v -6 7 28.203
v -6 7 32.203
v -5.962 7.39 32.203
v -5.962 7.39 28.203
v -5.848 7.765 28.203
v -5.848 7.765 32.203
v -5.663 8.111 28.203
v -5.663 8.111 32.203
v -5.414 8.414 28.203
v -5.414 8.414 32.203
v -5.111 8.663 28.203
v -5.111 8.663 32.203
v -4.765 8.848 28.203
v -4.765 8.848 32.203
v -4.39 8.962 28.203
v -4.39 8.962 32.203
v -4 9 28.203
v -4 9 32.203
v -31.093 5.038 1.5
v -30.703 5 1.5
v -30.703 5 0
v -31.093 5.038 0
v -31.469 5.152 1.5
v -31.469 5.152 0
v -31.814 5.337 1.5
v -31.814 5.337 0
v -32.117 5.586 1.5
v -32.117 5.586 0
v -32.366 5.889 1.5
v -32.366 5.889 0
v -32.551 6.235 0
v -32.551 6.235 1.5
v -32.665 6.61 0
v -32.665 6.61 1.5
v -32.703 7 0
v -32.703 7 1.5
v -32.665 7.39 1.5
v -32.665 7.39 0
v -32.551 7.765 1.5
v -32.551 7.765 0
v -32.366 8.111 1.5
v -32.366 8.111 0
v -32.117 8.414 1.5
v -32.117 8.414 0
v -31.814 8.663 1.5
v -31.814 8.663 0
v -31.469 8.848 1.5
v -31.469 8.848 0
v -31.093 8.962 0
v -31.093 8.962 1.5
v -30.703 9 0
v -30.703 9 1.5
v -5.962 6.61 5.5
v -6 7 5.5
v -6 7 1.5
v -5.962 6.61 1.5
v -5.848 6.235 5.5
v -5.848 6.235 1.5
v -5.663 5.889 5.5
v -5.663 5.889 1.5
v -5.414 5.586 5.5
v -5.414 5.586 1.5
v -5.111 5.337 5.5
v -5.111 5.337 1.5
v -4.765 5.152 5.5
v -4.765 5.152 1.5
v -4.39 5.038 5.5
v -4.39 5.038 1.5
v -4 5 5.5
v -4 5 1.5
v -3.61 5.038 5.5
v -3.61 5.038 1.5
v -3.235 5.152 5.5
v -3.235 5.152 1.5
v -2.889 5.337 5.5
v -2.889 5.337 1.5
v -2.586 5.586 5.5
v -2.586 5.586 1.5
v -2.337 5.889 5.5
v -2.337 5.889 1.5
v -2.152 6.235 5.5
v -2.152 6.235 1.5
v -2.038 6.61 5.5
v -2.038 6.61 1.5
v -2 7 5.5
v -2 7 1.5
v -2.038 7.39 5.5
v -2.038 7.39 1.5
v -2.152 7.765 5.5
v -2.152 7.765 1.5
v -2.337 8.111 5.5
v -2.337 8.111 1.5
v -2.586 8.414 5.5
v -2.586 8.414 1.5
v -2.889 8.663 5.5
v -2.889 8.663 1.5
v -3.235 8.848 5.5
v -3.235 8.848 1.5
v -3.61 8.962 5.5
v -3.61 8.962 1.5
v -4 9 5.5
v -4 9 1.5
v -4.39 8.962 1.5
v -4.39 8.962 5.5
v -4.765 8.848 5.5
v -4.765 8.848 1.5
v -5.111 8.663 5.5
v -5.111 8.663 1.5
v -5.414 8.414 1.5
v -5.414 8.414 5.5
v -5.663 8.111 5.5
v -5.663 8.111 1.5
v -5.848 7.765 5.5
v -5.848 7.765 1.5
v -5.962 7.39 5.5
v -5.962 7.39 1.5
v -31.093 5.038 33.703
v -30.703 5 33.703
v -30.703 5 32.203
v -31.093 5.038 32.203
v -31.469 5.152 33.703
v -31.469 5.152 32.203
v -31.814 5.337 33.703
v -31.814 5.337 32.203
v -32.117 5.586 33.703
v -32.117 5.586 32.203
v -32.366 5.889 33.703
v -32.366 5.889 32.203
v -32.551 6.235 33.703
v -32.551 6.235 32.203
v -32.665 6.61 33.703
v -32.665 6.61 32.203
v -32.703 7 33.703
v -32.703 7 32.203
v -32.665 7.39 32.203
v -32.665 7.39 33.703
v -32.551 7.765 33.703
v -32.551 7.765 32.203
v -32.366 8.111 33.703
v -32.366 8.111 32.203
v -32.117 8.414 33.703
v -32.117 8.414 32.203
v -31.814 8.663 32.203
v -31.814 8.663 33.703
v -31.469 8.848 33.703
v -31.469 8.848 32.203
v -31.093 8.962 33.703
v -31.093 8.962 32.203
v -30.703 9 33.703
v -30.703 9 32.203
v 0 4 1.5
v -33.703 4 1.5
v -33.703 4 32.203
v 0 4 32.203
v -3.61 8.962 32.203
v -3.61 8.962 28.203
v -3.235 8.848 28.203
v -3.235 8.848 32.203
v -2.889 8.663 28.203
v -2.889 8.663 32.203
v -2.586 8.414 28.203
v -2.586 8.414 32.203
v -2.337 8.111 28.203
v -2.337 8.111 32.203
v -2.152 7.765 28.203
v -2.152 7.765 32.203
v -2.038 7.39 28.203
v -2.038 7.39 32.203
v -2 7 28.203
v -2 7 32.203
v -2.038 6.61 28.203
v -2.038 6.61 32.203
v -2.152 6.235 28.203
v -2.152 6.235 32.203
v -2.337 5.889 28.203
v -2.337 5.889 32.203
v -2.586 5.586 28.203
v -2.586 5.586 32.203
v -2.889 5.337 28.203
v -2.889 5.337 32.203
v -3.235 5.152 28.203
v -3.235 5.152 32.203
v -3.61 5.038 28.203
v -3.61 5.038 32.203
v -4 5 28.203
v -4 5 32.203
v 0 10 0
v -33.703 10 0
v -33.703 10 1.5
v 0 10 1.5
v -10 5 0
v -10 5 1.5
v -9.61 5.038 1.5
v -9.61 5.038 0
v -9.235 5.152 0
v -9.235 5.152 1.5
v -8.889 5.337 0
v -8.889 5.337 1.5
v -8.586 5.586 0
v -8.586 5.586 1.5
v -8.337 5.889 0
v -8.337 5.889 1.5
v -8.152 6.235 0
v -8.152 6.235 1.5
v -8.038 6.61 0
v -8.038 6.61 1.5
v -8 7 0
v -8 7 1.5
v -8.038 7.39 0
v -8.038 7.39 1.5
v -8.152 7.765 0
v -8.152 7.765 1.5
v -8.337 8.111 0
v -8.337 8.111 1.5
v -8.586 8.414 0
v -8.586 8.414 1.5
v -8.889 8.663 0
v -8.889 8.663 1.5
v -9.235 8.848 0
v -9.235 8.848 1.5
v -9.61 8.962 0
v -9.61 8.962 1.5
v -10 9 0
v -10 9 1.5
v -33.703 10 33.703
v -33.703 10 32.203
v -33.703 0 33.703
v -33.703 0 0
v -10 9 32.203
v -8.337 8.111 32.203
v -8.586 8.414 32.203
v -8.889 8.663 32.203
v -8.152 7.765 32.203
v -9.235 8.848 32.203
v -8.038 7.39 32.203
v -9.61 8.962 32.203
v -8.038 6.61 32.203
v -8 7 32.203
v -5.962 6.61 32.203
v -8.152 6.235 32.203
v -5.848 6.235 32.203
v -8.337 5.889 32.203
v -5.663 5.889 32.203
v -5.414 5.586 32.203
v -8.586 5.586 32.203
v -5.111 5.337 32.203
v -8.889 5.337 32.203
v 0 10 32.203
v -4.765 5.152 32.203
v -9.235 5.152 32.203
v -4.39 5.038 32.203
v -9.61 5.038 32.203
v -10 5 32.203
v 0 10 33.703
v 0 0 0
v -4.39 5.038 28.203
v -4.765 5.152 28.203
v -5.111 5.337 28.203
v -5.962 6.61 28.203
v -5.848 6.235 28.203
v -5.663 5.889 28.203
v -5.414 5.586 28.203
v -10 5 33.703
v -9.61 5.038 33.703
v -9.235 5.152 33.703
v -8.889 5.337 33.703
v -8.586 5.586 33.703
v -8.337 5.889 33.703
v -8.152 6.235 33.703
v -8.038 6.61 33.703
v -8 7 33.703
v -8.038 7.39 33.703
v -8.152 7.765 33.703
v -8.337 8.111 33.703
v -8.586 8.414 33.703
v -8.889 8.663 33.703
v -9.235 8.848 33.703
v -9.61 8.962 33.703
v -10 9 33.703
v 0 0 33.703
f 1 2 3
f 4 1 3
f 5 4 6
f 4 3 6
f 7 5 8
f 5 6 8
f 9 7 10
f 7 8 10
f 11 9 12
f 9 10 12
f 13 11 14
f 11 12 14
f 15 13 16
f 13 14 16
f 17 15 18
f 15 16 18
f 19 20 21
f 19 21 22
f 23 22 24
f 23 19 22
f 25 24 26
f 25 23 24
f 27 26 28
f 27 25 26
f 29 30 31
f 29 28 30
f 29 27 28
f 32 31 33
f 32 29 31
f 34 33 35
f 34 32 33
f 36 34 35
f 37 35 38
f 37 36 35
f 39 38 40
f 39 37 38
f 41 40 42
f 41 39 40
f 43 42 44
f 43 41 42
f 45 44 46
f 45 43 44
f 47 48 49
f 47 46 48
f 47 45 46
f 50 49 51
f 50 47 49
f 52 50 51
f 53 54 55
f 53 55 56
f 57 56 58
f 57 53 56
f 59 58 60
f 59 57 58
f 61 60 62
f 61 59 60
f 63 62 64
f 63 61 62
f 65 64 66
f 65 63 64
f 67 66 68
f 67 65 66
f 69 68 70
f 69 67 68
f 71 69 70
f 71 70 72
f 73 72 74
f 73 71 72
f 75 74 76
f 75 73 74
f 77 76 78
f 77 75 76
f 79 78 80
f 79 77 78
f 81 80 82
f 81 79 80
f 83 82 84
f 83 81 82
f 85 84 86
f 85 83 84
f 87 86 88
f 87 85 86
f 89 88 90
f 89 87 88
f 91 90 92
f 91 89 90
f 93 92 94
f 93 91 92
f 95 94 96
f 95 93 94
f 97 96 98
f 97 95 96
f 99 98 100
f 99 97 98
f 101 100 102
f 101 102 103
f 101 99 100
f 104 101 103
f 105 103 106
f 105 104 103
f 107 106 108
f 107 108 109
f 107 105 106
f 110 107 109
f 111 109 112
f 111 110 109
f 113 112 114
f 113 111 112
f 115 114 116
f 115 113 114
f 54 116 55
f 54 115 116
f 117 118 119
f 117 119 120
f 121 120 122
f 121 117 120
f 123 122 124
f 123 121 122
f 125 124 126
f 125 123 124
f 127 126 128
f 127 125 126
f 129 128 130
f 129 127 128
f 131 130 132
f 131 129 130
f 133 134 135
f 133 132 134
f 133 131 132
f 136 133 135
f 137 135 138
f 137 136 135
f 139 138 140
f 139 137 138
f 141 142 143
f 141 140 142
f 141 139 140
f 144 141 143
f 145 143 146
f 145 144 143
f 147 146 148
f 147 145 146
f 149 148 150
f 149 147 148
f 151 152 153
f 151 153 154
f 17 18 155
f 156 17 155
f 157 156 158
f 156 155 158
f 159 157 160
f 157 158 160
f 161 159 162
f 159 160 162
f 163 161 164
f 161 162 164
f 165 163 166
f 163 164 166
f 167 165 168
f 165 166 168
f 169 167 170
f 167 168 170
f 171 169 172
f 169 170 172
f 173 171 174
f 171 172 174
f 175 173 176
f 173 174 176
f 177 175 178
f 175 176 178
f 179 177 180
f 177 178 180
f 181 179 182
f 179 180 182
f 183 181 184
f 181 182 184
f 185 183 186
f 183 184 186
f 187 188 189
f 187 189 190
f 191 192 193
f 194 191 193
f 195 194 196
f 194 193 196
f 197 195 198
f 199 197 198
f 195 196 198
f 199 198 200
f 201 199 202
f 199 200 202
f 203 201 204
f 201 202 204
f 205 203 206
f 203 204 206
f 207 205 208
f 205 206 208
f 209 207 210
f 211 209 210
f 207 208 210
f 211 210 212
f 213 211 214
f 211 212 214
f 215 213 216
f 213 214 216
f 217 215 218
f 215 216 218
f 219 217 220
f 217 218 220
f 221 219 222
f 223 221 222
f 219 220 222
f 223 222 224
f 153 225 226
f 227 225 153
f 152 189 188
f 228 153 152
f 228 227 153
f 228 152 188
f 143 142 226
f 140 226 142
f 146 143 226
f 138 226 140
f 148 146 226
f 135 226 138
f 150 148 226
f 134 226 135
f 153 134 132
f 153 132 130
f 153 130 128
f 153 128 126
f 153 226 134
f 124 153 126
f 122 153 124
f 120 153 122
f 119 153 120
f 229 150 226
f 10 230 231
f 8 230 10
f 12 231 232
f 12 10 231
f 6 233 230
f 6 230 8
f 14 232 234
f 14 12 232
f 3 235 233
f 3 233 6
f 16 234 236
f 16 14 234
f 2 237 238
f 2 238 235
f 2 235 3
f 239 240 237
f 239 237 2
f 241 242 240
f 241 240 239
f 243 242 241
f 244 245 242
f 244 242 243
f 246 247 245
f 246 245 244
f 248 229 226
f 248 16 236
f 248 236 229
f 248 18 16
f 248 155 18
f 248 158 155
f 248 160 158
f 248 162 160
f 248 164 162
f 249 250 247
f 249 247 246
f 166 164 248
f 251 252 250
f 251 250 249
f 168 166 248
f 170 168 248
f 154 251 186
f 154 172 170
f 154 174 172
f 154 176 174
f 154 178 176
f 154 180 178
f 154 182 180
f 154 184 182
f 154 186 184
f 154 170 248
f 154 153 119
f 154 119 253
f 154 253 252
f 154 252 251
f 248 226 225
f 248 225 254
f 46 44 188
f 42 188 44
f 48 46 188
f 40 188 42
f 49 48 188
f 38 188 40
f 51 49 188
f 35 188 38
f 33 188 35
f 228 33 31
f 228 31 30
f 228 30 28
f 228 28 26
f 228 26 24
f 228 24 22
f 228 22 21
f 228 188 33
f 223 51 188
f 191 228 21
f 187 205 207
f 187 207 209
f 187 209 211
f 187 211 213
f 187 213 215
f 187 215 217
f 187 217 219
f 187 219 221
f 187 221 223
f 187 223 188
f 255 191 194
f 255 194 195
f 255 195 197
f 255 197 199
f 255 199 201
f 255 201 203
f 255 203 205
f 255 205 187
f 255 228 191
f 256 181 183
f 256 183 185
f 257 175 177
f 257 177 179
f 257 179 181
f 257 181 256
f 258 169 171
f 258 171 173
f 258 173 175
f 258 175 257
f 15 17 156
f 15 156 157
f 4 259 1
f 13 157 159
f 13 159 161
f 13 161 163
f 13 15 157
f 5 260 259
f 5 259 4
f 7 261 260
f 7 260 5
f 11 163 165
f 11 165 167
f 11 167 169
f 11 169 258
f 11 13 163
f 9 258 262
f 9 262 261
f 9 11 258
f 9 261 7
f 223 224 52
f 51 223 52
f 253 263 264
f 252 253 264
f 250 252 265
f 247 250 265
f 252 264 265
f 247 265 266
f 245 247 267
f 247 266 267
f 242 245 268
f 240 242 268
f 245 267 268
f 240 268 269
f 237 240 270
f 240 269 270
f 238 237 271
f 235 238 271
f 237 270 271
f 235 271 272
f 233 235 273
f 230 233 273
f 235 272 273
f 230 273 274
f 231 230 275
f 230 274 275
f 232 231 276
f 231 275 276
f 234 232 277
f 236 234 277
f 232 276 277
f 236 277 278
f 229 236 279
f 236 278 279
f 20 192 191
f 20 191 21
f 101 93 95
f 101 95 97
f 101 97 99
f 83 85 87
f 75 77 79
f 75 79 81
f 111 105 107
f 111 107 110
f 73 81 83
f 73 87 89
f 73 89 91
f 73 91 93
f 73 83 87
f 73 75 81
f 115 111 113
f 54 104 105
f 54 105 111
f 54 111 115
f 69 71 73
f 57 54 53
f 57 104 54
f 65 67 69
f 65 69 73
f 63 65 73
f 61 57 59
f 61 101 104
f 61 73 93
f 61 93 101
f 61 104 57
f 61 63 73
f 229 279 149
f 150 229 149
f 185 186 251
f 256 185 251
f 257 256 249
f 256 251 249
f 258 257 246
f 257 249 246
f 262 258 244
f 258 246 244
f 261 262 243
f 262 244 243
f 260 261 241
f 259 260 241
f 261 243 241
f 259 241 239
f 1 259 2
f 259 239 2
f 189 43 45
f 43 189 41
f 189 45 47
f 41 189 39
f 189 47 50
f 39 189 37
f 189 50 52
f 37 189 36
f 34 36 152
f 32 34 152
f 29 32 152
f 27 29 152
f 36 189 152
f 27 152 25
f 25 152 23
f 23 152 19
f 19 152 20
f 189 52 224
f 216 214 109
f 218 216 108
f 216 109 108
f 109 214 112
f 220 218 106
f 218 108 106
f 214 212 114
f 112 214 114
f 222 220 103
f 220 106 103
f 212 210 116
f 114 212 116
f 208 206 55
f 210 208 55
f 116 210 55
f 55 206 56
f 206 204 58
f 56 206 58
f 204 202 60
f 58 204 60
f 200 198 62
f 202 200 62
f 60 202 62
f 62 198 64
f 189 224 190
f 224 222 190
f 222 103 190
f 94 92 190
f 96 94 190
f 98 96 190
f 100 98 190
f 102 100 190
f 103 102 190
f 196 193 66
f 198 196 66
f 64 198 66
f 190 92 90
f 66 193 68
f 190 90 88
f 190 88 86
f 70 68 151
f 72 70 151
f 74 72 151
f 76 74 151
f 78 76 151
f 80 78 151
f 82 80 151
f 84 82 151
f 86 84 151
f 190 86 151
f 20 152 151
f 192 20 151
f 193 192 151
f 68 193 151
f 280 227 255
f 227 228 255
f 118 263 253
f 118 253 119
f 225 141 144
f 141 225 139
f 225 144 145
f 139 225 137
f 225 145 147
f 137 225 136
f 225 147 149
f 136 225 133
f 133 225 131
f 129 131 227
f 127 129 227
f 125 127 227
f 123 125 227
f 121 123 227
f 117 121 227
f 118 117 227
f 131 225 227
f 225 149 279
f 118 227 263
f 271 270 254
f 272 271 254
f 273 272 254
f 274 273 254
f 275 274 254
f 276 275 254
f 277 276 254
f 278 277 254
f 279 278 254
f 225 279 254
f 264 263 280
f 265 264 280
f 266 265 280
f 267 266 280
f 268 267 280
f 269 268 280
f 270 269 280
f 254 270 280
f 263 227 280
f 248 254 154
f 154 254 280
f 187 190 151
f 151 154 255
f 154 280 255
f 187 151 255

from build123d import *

# Parameters (mm, degrees)
SKETCH1_W               = 33.703234699
SKETCH1_H               = 30.703234699
BOSS_EXTRUDE1_DEPTH     = 4
SKETCH1_3_W             = 33.703234699
SKETCH1_3_H             = 1.5
BOSS_EXTRUDE2_DEPTH     = 10
SKETCH5_R               = 2
BOSS_EXTRUDE3_DEPTH     = 4
BOSS_EXTRUDE4_START     = 4
SKETCH4_R               = 2
BOSS_EXTRUDE4_DEPTH     = 4
CUT_EXTRUDE1_DEPTH      = 38
CUT_EXTRUDE1_DEPTH_BACK = 10


with BuildPart() as part:
    # Sketch1 → Boss-Extrude1 (new body)
    with BuildSketch(Plane(origin=(0, 0, 0), x_dir=(1, 0, 0), z_dir=(0, 1, 0))):
        with Locations((-16.851617349, -16.851617349)):
            Rectangle(SKETCH1_W, SKETCH1_H)
    extrude(amount=BOSS_EXTRUDE1_DEPTH)

    # Sketch1<3> → Boss-Extrude2 (add)
    with BuildSketch(Plane(origin=(0, 0, 0), x_dir=(1, 0, 0), z_dir=(0, 1, 0))):
        with Locations((-16.851617349, -32.953234699)):
            Rectangle(SKETCH1_3_W, SKETCH1_3_H)
        with Locations((-16.851617349, -0.75)):
            Rectangle(SKETCH1_3_W, SKETCH1_3_H)
    extrude(amount=BOSS_EXTRUDE2_DEPTH)

    # Sketch5 → Boss-Extrude3 (add)
    with BuildSketch(Plane(origin=(0, 0, 32.203234699), x_dir=(-1, 0, 0), z_dir=(0, 0, -1))):
        with Locations((4, 7)):
            Circle(SKETCH5_R)
    extrude(amount=BOSS_EXTRUDE3_DEPTH)

    # Sketch4 → Boss-Extrude4 (add)
    with BuildSketch(Plane.XY.offset(1.5).offset(BOSS_EXTRUDE4_START)):
        with Locations((-4, 7)):
            Circle(SKETCH4_R)
    extrude(amount=-BOSS_EXTRUDE4_DEPTH)

    # Sketch11 → Cut-Extrude1 (cut, two sides: drawn at the far end of the back side and taken through both)
    with BuildSketch(Plane(origin=(0, 0, 32.203234699), x_dir=(-1, 0, 0), z_dir=(0, 0, -1)).offset(-CUT_EXTRUDE1_DEPTH_BACK)):
        with BuildLine():
            ThreePointArc((30.703234699, 5), (32.703234699, 7), (30.703234699, 9))
            Line((30.703234699, 9), (10, 9))
            ThreePointArc((10, 9), (8, 7), (10, 5))
            Line((10, 5), (30.703234699, 5))
        make_face()
    extrude(amount=CUT_EXTRUDE1_DEPTH + CUT_EXTRUDE1_DEPTH_BACK, mode=Mode.SUBTRACT)


solid = part.part
